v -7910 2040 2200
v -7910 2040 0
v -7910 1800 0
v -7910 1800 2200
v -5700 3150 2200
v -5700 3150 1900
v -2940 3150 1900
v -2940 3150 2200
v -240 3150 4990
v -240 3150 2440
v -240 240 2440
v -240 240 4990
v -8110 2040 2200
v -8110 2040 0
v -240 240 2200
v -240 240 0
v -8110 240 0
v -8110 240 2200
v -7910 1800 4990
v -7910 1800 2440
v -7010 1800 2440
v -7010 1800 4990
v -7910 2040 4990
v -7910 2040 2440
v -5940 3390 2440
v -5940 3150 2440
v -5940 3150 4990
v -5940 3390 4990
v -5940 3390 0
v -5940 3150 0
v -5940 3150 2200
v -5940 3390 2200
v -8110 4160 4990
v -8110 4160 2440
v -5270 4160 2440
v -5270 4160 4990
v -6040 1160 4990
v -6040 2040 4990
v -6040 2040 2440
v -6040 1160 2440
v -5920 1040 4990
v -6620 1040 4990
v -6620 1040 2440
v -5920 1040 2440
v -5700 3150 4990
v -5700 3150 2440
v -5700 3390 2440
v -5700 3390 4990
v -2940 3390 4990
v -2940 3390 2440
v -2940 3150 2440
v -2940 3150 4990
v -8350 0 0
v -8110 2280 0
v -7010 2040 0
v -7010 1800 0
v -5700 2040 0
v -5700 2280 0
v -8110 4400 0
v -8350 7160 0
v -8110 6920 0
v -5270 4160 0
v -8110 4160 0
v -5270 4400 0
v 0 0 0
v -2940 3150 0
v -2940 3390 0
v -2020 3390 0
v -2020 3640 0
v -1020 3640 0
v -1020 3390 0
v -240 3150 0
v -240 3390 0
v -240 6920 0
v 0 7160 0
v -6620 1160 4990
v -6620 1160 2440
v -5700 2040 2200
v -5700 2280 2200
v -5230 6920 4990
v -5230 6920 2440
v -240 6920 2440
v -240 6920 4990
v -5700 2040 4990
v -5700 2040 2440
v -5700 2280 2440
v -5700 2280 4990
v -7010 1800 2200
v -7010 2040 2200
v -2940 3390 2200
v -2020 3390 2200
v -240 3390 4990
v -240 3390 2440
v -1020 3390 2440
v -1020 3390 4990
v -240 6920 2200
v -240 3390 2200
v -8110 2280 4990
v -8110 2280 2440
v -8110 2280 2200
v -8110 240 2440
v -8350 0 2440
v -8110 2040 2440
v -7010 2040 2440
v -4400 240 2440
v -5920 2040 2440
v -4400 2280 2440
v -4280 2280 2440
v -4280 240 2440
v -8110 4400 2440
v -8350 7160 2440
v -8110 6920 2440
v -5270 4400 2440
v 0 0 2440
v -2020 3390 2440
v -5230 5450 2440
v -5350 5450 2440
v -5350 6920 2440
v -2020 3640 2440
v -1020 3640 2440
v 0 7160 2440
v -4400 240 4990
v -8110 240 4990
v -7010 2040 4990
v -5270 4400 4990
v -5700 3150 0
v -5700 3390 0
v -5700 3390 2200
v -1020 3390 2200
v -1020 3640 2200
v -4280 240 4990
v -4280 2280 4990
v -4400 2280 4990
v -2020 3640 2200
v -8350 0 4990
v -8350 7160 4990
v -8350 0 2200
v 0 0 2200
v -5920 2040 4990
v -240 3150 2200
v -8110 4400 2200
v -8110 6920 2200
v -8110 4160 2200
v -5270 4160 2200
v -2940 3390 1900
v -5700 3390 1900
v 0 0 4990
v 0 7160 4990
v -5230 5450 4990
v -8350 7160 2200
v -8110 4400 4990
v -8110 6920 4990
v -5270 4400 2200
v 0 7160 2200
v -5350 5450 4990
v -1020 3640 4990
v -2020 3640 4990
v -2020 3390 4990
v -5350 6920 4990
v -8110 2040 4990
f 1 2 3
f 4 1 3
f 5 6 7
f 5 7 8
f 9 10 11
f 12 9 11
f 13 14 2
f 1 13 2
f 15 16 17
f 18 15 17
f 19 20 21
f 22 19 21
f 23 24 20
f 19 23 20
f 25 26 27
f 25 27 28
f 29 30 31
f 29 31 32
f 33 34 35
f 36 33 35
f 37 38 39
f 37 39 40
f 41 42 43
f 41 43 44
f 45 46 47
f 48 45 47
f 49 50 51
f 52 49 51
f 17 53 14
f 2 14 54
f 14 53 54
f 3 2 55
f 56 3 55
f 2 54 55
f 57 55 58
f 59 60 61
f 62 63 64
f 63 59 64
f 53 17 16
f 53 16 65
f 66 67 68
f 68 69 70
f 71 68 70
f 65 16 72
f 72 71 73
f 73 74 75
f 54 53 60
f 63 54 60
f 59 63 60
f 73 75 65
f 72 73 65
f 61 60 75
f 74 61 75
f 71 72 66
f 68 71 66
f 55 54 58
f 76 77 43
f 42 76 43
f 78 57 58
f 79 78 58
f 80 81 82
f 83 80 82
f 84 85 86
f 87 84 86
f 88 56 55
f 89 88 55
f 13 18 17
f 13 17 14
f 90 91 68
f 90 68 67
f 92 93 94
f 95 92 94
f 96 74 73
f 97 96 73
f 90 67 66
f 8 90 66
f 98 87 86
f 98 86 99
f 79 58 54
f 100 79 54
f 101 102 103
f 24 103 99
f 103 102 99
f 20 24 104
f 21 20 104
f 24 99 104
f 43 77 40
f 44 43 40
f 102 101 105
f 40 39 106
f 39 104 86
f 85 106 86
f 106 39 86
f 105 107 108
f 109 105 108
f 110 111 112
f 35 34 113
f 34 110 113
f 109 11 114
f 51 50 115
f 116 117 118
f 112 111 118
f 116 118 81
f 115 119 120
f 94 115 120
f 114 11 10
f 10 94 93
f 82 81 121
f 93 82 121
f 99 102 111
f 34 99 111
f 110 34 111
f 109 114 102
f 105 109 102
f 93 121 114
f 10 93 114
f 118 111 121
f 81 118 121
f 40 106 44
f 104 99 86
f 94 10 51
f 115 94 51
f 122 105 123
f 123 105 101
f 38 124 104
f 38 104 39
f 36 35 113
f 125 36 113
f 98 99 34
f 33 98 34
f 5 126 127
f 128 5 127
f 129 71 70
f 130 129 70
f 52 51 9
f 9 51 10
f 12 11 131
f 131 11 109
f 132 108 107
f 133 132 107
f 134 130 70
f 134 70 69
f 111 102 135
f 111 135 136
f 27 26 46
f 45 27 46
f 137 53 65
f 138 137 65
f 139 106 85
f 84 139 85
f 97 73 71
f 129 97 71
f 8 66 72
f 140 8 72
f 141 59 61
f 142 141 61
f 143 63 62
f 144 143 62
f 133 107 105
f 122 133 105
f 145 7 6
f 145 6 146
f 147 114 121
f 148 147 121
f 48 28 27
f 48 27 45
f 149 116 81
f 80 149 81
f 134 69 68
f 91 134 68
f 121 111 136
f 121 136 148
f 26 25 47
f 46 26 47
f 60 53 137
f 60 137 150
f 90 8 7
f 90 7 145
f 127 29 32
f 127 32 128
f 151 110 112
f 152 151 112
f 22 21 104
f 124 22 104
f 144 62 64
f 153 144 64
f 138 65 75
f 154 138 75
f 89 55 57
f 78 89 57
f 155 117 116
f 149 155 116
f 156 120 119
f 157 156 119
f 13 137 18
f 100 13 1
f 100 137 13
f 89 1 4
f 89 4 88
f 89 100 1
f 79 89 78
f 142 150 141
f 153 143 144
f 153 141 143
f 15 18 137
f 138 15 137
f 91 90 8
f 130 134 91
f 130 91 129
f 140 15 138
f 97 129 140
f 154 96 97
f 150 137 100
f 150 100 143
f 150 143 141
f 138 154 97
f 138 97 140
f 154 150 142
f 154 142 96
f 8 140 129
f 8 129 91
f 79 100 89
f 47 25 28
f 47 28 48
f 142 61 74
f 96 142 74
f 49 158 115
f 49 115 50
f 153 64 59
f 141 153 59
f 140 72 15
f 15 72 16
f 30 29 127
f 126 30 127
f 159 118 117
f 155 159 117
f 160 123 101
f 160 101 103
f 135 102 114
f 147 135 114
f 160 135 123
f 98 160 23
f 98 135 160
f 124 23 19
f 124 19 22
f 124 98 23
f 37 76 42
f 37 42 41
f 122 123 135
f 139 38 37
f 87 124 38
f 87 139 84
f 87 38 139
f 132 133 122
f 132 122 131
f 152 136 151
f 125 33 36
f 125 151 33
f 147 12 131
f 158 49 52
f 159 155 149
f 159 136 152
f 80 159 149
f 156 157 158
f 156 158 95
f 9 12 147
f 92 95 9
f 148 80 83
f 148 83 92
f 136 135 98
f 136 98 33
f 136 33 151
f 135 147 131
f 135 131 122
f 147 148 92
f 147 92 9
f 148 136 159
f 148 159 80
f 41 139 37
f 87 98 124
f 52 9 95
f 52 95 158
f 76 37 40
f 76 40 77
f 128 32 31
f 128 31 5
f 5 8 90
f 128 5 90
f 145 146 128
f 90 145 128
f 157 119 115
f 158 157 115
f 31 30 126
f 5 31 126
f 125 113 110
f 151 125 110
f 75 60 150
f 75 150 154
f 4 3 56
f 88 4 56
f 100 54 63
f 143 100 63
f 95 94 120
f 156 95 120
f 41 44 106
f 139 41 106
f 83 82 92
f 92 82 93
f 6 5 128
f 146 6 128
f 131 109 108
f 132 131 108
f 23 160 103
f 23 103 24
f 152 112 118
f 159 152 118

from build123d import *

# Parameters (mm, degrees)
F0_W     = 8350
F0_H     = 7160
F1_DEPTH = 2200
F0_W_2   = 240
F0_H_2   = 240
F2_DEPTH = 2200
F3_W     = 240
F3_H     = 300
F4_DEPTH = 2760
F6_W     = 8350
F6_H     = 7160
F7_DEPTH = 2550
F6_W_2   = 240
F6_H_2   = 240


with BuildPart() as f1:
    # F0 (on Top) → F1 (new body)
    with BuildSketch(Plane.XY):
        with Locations((-4175, 3580)):
            Rectangle(F0_W, F0_H)
        Polygon((-8110, 6920), (-240, 6920), (-240, 3390), (-1020, 3390), (-1020, 3640), (-2020, 3640), (-2020, 3390), (-2940, 3390), (-2940, 3150), (-240, 3150), (-240, 240), (-8110, 240), (-8110, 2040), (-7910, 2040), (-7910, 1800), (-7010, 1800), (-7010, 2040), (-5700, 2040), (-5700, 2280), (-8110, 2280), (-8110, 4160), (-5270, 4160), (-5270, 4400), (-8110, 4400), align=None, mode=Mode.SUBTRACT)
    extrude(amount=F1_DEPTH)


with BuildPart() as f2:
    # F0 (on Top) → F2 (new body)
    with BuildSketch(Plane.XY):
        with Locations((-5820, 3270)):
            Rectangle(F0_W_2, F0_H_2)
    extrude(amount=F2_DEPTH)


with BuildPart() as f4:
    # F3 (on face) → F4 (new body, through all)
    with BuildSketch(Plane.YZ.offset(-5700)):
        with Locations((3270, 2050)):
            Rectangle(F3_W, F3_H)
    extrude(amount=F4_DEPTH)


with BuildPart() as f7:
    # F6 (on offset) → F7 (new body)
    with BuildSketch(Plane.XY.offset(2440)):
        with Locations((-4175, 3580)):
            Rectangle(F6_W, F6_H)
        Polygon((-4400, 240), (-8110, 240), (-8110, 2040), (-7910, 2040), (-7910, 1800), (-7010, 1800), (-7010, 2040), (-6040, 2040), (-6040, 1160), (-6620, 1160), (-6620, 1040), (-5920, 1040), (-5920, 2040), (-5700, 2040), (-5700, 2280), (-8110, 2280), (-8110, 4160), (-5270, 4160), (-5270, 4400), (-8110, 4400), (-8110, 6920), (-5350, 6920), (-5350, 5450), (-5230, 5450), (-5230, 6920), (-240, 6920), (-240, 3390), (-1020, 3390), (-1020, 3640), (-2020, 3640), (-2020, 3390), (-2940, 3390), (-2940, 3150), (-240, 3150), (-240, 240), (-4280, 240), (-4280, 1680), (-4280, 1800), (-4280, 2280), (-4400, 2280), align=None, mode=Mode.SUBTRACT)
    extrude(amount=F7_DEPTH)


with BuildPart() as f7b:
    # F6 (on offset) → F7, piece 2 (new body)
    with BuildSketch(Plane.XY.offset(2440)):
        with Locations((-5820, 3270)):
            Rectangle(F6_W_2, F6_H_2)
    extrude(amount=F7_DEPTH)


solid = Compound([f1.part, f2.part, f4.part, f7.part, f7b.part])
